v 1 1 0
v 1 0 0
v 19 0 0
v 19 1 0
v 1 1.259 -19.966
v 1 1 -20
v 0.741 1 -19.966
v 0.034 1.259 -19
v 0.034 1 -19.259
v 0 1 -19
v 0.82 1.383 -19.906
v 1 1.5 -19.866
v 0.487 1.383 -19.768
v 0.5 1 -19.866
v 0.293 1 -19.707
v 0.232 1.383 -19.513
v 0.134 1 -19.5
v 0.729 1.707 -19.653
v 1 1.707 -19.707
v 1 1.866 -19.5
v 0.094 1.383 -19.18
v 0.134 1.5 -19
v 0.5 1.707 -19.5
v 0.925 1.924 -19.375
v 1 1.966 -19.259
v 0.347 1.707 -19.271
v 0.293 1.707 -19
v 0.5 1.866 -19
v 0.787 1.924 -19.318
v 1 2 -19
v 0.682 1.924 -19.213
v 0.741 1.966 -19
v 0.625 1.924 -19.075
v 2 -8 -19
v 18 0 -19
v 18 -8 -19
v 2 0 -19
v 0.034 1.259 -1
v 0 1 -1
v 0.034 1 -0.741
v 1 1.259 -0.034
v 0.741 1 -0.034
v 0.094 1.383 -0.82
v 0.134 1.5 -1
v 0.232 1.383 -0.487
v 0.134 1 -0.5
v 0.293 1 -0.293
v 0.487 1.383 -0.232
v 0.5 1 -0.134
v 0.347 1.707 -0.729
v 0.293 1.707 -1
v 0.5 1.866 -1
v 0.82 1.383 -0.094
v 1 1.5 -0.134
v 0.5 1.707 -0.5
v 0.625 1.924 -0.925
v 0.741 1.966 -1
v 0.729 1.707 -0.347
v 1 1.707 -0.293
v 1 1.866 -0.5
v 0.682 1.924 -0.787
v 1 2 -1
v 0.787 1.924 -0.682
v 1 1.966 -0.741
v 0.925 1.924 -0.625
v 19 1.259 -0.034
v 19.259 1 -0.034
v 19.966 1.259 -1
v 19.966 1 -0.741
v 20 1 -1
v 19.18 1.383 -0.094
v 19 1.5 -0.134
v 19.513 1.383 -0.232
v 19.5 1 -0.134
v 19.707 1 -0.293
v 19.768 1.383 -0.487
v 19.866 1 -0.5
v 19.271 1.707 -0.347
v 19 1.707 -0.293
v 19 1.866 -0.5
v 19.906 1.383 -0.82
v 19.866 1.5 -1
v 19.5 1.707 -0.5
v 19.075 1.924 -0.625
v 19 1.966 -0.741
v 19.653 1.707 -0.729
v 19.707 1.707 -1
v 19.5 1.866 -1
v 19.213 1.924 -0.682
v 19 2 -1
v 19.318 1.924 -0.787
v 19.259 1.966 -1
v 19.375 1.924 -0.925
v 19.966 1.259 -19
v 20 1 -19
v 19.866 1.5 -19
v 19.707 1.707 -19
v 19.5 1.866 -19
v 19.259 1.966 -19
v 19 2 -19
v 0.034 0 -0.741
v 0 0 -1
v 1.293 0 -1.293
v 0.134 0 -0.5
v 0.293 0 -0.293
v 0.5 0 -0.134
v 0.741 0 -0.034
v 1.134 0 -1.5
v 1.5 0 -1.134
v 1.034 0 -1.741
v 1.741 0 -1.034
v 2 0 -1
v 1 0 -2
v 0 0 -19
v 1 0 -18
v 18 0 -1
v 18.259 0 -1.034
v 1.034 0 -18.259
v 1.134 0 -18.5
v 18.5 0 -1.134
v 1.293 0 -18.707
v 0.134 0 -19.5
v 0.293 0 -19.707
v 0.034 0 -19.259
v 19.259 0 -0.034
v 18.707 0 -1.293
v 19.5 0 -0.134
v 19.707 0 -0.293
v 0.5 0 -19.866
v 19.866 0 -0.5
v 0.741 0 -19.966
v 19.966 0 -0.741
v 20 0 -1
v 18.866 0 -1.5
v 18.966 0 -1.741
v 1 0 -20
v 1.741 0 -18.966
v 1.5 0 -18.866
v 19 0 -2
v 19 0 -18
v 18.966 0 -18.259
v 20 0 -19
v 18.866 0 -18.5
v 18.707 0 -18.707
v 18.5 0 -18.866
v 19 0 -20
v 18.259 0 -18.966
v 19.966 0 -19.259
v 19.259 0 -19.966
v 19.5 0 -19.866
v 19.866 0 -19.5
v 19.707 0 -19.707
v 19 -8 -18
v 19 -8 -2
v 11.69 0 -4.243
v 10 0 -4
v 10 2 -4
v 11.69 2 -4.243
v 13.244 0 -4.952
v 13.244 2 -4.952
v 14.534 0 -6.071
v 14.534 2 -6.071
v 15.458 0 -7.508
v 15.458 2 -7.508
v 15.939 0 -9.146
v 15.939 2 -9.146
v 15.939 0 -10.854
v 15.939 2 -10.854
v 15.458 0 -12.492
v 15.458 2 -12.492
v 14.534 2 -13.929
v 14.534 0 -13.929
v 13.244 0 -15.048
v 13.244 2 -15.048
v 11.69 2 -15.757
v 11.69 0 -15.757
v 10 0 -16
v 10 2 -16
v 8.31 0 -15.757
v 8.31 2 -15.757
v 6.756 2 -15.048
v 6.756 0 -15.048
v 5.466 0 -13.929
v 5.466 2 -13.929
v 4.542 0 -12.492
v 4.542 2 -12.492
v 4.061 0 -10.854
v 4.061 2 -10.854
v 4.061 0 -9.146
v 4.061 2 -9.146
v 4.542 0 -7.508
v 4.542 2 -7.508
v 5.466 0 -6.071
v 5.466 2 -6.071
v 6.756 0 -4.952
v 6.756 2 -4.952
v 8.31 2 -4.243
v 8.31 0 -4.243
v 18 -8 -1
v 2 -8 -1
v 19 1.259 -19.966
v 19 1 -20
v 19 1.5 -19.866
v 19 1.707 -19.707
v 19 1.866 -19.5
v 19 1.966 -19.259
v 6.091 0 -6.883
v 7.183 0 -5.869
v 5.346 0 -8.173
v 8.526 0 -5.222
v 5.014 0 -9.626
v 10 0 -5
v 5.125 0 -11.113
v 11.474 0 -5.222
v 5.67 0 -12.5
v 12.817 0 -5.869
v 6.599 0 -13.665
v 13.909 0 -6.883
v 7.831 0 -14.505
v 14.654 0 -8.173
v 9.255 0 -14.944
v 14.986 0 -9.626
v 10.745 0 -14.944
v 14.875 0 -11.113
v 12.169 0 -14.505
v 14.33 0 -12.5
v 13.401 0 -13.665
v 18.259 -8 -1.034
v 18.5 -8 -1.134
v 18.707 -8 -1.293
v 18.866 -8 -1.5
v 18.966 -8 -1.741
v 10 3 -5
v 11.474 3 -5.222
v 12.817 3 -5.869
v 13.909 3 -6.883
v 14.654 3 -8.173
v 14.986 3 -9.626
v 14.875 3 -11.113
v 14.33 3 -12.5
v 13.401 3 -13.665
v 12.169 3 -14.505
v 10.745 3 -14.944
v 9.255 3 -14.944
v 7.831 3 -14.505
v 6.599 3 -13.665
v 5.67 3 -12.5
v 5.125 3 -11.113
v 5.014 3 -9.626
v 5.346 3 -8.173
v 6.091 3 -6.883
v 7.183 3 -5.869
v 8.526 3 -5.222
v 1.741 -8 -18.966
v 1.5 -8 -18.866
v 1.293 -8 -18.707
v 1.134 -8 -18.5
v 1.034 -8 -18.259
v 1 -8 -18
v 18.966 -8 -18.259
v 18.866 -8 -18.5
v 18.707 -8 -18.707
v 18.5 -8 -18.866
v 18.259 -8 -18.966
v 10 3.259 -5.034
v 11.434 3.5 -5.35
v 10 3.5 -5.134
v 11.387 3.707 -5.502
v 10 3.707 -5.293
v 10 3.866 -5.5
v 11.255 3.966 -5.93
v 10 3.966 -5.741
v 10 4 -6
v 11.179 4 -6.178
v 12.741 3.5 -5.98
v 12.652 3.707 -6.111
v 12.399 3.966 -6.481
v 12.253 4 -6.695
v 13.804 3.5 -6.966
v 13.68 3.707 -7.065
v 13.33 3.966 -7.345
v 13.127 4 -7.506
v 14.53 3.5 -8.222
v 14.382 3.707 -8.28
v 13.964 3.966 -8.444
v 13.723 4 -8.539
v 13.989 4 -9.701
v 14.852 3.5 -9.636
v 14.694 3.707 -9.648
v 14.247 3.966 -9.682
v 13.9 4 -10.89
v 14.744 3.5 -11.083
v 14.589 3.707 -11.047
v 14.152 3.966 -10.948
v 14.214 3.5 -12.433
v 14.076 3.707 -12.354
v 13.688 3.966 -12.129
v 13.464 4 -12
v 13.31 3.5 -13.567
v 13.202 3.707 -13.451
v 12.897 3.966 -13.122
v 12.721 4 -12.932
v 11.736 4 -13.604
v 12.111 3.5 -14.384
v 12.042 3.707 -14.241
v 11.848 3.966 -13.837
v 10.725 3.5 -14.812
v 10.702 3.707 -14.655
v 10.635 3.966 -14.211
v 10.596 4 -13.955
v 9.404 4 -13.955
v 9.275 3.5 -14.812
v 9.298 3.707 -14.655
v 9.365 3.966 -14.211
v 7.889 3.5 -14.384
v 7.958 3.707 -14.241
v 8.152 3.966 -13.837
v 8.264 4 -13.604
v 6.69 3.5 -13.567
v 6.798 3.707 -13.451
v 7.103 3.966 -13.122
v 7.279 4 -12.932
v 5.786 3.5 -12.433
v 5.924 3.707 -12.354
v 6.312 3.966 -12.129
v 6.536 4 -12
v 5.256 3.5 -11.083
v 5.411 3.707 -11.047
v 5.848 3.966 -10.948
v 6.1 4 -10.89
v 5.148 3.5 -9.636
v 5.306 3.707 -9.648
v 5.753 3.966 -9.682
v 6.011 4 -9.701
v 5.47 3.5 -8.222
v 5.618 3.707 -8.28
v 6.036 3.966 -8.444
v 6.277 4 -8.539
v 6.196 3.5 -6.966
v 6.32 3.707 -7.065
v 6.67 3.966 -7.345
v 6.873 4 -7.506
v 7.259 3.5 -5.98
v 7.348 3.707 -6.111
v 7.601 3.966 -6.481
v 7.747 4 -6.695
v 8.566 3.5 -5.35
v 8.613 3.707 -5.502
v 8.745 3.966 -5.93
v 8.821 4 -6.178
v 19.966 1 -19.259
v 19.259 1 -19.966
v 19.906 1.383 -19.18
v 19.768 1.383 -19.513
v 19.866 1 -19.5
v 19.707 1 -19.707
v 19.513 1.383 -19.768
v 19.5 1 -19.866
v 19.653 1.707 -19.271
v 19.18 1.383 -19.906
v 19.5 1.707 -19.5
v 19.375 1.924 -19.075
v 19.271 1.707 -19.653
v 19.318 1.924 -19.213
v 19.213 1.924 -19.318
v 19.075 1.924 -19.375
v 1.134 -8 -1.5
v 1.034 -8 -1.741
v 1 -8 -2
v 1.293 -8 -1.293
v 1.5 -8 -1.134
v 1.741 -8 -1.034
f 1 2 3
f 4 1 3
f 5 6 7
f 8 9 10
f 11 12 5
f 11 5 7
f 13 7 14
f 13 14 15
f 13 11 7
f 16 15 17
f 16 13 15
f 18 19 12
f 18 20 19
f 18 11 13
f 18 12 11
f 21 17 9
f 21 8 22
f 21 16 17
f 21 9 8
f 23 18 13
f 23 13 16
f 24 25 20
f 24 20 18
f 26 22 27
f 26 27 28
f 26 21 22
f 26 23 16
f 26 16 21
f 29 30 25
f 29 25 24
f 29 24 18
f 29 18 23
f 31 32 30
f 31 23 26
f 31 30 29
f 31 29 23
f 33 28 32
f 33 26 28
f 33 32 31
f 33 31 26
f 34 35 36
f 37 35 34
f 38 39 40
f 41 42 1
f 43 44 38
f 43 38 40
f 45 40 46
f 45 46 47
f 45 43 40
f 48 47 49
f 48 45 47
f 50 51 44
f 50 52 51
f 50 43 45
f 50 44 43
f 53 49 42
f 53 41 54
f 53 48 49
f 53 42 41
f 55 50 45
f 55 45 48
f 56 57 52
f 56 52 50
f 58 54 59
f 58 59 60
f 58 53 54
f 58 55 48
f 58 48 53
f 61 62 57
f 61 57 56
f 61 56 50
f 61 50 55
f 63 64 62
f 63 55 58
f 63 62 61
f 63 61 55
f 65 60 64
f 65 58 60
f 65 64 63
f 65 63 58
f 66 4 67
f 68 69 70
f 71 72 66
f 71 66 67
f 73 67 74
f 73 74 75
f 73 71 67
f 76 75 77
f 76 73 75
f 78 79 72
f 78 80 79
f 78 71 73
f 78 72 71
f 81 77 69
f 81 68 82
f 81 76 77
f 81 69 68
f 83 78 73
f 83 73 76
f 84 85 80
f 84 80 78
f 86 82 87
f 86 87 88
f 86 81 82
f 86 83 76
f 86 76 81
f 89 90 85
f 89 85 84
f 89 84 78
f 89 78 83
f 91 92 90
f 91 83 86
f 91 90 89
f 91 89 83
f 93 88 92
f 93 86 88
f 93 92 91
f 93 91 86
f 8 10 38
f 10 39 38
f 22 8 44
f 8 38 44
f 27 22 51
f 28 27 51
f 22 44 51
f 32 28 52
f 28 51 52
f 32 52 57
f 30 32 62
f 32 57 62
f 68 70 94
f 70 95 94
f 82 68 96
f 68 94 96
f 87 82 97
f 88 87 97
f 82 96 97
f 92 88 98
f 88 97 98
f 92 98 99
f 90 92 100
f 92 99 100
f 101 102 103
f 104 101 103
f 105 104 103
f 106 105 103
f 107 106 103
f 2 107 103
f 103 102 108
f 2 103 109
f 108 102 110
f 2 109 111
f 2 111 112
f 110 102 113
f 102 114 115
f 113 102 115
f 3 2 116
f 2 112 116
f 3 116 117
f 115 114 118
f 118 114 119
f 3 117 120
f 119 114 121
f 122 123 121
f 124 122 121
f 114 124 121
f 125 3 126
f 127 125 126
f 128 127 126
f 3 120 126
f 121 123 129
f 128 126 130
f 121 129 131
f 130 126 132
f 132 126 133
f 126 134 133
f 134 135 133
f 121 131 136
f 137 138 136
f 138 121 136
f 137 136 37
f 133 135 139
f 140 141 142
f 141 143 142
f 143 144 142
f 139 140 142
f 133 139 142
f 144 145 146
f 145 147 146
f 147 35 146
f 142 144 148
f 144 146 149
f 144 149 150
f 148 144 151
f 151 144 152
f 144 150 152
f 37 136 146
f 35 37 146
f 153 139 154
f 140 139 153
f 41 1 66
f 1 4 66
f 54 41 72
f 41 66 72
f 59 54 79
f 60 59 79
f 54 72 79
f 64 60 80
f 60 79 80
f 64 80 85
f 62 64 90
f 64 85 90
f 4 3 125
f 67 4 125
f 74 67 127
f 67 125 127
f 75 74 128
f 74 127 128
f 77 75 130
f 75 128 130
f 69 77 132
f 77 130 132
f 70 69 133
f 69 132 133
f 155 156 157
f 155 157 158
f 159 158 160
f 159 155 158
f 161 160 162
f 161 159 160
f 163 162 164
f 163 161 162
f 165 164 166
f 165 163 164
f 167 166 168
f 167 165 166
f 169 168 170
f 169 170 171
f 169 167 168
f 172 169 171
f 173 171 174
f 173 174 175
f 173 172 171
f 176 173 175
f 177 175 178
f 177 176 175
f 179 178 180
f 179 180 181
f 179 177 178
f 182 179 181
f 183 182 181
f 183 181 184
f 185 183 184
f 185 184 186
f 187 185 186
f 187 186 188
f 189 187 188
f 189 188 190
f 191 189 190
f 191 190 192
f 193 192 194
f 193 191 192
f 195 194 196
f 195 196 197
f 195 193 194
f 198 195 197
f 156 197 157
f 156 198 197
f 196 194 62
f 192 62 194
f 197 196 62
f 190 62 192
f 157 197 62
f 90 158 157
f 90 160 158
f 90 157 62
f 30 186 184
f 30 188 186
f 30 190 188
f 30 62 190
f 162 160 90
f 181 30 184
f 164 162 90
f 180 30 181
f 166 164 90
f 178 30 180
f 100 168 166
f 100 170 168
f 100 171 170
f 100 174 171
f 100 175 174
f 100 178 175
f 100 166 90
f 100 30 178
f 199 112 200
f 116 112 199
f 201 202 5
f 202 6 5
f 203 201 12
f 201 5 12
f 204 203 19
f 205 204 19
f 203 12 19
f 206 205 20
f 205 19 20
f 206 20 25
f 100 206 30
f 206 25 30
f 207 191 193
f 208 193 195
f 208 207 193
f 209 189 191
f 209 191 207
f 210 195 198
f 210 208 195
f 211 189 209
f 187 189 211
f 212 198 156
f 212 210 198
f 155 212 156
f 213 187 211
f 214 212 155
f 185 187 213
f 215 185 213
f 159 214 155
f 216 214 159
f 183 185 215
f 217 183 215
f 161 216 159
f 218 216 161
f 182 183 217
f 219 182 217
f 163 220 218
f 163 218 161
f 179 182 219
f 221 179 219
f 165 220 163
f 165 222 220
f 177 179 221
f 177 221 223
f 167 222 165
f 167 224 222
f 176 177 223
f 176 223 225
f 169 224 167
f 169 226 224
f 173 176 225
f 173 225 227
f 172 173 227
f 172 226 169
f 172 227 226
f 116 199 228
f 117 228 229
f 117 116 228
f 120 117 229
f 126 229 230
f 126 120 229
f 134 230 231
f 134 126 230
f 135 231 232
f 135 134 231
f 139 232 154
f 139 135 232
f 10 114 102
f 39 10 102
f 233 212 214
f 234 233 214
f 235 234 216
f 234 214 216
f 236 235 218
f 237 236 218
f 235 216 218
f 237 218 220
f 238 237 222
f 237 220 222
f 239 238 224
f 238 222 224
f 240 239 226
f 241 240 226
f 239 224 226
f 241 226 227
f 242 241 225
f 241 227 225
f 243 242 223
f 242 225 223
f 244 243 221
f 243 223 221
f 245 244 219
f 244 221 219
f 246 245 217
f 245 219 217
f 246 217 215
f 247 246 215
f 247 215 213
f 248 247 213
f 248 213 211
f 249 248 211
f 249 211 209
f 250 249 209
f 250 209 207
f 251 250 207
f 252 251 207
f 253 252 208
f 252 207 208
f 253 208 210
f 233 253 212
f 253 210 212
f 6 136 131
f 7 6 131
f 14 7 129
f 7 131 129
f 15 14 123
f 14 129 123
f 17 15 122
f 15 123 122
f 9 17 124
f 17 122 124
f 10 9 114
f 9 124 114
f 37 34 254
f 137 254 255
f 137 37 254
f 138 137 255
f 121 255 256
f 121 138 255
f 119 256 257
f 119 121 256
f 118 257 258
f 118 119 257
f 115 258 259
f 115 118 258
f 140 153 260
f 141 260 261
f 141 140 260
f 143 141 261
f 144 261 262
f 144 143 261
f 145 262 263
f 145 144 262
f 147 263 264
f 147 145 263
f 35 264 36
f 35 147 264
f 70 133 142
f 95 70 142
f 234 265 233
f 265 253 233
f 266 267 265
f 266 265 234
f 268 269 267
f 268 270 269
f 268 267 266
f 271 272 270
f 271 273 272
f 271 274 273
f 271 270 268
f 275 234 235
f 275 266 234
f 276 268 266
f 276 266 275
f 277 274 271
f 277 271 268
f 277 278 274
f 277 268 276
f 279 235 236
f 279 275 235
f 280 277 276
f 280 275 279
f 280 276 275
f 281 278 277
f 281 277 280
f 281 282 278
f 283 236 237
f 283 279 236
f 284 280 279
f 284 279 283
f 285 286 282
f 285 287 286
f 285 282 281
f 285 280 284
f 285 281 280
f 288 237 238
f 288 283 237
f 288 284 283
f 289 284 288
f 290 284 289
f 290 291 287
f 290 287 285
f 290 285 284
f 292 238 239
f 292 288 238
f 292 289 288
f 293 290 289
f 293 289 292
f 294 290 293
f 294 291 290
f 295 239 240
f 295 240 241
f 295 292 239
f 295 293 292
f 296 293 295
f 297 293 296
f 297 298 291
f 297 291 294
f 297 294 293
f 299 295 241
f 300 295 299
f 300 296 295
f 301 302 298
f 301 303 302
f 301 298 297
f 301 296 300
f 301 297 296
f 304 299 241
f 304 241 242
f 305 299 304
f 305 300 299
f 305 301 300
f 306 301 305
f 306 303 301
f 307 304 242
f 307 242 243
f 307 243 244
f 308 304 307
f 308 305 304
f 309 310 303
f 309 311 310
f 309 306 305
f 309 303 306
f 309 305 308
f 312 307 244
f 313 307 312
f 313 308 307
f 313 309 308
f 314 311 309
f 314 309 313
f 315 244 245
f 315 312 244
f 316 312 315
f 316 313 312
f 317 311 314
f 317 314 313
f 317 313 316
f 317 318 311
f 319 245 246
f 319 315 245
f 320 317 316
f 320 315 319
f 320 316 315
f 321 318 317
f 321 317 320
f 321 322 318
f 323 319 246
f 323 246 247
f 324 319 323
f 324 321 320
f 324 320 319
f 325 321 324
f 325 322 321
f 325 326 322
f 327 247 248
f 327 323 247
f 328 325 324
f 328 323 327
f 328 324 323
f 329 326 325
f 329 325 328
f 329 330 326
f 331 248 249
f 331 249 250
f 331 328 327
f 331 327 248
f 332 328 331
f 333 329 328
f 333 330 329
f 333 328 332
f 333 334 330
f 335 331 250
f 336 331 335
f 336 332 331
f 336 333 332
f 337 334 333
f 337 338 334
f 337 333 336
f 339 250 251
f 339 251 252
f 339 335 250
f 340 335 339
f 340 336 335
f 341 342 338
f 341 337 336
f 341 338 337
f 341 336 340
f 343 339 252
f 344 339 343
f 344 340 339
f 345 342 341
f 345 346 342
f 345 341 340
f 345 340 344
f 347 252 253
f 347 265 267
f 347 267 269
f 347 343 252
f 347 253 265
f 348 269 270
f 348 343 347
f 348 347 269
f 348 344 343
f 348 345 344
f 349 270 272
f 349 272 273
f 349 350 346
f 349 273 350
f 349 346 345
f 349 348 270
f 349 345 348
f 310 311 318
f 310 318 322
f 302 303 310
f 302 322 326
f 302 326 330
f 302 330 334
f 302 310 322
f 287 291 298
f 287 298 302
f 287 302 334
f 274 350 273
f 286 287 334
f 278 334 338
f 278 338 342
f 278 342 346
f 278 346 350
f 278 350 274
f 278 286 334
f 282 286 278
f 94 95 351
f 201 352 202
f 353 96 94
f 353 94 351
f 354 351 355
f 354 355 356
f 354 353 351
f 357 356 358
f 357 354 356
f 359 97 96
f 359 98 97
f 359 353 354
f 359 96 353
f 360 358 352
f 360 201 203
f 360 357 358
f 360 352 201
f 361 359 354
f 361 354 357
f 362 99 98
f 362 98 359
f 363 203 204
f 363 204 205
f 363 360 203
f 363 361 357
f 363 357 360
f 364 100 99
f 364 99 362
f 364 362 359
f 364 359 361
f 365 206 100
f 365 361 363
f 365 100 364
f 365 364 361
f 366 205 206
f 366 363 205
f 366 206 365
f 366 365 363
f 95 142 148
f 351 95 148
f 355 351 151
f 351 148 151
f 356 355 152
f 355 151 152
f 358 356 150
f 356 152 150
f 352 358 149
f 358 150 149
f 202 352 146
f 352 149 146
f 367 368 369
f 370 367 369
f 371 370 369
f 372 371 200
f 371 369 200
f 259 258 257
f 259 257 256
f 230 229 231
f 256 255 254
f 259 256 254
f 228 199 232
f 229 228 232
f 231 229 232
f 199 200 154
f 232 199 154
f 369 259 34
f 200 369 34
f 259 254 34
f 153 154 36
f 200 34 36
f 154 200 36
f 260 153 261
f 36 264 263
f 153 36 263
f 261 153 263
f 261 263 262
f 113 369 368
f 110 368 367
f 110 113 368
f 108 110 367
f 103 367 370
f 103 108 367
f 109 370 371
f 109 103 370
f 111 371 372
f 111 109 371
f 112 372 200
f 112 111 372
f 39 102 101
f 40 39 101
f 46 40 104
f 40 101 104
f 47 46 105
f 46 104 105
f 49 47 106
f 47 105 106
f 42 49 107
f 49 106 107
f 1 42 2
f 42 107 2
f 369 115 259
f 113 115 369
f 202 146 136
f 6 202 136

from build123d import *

# Parameters (mm, degrees)
SKETCH1_R           = 6
BOSS_EXTRUDE1_DEPTH = 2
BOSS_EXTRUDE2_DEPTH = 8
SKETCH3_R           = 5
BOSS_EXTRUDE3_DEPTH = 4
FILLET1_R           = 1


with BuildPart() as part:
    # Sketch1 → Boss-Extrude1 (new body)
    with BuildSketch(Plane(origin=(0, 0, 0), x_dir=(1, 0, 0), z_dir=(0, 1, 0))):
        with BuildLine():
            Line((1, 0), (19, 0))
            ThreePointArc((19, 0), (19.707106781, 0.292893219), (20, 1))
            Line((20, 1), (20, 19))
            ThreePointArc((20, 19), (19.707106781, 19.707106781), (19, 20))
            Line((19, 20), (1, 20))
            ThreePointArc((1, 20), (0.292893219, 19.707106781), (0, 19))
            Line((0, 19), (0, 1))
            ThreePointArc((0, 1), (0.292893219, 0.292893219), (1, 0))
        make_face()
        with Locations(Location((10, 10, 0), (0, 0, 270))):
            Circle(SKETCH1_R, mode=Mode.SUBTRACT)
    extrude(amount=BOSS_EXTRUDE1_DEPTH)

    # Sketch2 → Boss-Extrude2 (add)
    with BuildSketch(Plane(origin=(0, 0, 0), x_dir=(1, 0, 0), z_dir=(0, 1, 0))):
        with BuildLine():
            Line((2, 1), (18, 1))
            ThreePointArc((18, 1), (18.707106781, 1.292893219), (19, 2))
            Line((19, 2), (19, 18))
            ThreePointArc((19, 18), (18.707106781, 18.707106781), (18, 19))
            Line((18, 19), (2, 19))
            ThreePointArc((2, 19), (1.292893219, 18.707106781), (1, 18))
            Line((1, 18), (1, 2))
            ThreePointArc((1, 2), (1.292893219, 1.292893219), (2, 1))
        make_face()
    extrude(amount=-BOSS_EXTRUDE2_DEPTH)

    # Sketch3 → Boss-Extrude3 (add)
    with BuildSketch(Plane(origin=(0, 0, 0), x_dir=(1, 0, 0), z_dir=(0, 1, 0))):
        with Locations(Location((10, 10, 0), (0, 0, 270))):
            Circle(SKETCH3_R)
    extrude(amount=BOSS_EXTRUDE3_DEPTH)

    # Fillet1
    fillet1_edges = [part.edges().sort_by_distance(p)[0] for p in [
        (19.707106781, 2, -0.292893219),
        (20, 2, -10),
        (19.707106781, 2, -19.707106781),
        (10, 2, -20),
        (0.292893219, 2, -19.707106781),
        (0, 2, -10),
        (0.292893219, 2, -0.292893219),
        (10, 4, -15),
        (10, 2, 0),
    ]]
    fillet(fillet1_edges, radius=FILLET1_R)


solid = part.part
